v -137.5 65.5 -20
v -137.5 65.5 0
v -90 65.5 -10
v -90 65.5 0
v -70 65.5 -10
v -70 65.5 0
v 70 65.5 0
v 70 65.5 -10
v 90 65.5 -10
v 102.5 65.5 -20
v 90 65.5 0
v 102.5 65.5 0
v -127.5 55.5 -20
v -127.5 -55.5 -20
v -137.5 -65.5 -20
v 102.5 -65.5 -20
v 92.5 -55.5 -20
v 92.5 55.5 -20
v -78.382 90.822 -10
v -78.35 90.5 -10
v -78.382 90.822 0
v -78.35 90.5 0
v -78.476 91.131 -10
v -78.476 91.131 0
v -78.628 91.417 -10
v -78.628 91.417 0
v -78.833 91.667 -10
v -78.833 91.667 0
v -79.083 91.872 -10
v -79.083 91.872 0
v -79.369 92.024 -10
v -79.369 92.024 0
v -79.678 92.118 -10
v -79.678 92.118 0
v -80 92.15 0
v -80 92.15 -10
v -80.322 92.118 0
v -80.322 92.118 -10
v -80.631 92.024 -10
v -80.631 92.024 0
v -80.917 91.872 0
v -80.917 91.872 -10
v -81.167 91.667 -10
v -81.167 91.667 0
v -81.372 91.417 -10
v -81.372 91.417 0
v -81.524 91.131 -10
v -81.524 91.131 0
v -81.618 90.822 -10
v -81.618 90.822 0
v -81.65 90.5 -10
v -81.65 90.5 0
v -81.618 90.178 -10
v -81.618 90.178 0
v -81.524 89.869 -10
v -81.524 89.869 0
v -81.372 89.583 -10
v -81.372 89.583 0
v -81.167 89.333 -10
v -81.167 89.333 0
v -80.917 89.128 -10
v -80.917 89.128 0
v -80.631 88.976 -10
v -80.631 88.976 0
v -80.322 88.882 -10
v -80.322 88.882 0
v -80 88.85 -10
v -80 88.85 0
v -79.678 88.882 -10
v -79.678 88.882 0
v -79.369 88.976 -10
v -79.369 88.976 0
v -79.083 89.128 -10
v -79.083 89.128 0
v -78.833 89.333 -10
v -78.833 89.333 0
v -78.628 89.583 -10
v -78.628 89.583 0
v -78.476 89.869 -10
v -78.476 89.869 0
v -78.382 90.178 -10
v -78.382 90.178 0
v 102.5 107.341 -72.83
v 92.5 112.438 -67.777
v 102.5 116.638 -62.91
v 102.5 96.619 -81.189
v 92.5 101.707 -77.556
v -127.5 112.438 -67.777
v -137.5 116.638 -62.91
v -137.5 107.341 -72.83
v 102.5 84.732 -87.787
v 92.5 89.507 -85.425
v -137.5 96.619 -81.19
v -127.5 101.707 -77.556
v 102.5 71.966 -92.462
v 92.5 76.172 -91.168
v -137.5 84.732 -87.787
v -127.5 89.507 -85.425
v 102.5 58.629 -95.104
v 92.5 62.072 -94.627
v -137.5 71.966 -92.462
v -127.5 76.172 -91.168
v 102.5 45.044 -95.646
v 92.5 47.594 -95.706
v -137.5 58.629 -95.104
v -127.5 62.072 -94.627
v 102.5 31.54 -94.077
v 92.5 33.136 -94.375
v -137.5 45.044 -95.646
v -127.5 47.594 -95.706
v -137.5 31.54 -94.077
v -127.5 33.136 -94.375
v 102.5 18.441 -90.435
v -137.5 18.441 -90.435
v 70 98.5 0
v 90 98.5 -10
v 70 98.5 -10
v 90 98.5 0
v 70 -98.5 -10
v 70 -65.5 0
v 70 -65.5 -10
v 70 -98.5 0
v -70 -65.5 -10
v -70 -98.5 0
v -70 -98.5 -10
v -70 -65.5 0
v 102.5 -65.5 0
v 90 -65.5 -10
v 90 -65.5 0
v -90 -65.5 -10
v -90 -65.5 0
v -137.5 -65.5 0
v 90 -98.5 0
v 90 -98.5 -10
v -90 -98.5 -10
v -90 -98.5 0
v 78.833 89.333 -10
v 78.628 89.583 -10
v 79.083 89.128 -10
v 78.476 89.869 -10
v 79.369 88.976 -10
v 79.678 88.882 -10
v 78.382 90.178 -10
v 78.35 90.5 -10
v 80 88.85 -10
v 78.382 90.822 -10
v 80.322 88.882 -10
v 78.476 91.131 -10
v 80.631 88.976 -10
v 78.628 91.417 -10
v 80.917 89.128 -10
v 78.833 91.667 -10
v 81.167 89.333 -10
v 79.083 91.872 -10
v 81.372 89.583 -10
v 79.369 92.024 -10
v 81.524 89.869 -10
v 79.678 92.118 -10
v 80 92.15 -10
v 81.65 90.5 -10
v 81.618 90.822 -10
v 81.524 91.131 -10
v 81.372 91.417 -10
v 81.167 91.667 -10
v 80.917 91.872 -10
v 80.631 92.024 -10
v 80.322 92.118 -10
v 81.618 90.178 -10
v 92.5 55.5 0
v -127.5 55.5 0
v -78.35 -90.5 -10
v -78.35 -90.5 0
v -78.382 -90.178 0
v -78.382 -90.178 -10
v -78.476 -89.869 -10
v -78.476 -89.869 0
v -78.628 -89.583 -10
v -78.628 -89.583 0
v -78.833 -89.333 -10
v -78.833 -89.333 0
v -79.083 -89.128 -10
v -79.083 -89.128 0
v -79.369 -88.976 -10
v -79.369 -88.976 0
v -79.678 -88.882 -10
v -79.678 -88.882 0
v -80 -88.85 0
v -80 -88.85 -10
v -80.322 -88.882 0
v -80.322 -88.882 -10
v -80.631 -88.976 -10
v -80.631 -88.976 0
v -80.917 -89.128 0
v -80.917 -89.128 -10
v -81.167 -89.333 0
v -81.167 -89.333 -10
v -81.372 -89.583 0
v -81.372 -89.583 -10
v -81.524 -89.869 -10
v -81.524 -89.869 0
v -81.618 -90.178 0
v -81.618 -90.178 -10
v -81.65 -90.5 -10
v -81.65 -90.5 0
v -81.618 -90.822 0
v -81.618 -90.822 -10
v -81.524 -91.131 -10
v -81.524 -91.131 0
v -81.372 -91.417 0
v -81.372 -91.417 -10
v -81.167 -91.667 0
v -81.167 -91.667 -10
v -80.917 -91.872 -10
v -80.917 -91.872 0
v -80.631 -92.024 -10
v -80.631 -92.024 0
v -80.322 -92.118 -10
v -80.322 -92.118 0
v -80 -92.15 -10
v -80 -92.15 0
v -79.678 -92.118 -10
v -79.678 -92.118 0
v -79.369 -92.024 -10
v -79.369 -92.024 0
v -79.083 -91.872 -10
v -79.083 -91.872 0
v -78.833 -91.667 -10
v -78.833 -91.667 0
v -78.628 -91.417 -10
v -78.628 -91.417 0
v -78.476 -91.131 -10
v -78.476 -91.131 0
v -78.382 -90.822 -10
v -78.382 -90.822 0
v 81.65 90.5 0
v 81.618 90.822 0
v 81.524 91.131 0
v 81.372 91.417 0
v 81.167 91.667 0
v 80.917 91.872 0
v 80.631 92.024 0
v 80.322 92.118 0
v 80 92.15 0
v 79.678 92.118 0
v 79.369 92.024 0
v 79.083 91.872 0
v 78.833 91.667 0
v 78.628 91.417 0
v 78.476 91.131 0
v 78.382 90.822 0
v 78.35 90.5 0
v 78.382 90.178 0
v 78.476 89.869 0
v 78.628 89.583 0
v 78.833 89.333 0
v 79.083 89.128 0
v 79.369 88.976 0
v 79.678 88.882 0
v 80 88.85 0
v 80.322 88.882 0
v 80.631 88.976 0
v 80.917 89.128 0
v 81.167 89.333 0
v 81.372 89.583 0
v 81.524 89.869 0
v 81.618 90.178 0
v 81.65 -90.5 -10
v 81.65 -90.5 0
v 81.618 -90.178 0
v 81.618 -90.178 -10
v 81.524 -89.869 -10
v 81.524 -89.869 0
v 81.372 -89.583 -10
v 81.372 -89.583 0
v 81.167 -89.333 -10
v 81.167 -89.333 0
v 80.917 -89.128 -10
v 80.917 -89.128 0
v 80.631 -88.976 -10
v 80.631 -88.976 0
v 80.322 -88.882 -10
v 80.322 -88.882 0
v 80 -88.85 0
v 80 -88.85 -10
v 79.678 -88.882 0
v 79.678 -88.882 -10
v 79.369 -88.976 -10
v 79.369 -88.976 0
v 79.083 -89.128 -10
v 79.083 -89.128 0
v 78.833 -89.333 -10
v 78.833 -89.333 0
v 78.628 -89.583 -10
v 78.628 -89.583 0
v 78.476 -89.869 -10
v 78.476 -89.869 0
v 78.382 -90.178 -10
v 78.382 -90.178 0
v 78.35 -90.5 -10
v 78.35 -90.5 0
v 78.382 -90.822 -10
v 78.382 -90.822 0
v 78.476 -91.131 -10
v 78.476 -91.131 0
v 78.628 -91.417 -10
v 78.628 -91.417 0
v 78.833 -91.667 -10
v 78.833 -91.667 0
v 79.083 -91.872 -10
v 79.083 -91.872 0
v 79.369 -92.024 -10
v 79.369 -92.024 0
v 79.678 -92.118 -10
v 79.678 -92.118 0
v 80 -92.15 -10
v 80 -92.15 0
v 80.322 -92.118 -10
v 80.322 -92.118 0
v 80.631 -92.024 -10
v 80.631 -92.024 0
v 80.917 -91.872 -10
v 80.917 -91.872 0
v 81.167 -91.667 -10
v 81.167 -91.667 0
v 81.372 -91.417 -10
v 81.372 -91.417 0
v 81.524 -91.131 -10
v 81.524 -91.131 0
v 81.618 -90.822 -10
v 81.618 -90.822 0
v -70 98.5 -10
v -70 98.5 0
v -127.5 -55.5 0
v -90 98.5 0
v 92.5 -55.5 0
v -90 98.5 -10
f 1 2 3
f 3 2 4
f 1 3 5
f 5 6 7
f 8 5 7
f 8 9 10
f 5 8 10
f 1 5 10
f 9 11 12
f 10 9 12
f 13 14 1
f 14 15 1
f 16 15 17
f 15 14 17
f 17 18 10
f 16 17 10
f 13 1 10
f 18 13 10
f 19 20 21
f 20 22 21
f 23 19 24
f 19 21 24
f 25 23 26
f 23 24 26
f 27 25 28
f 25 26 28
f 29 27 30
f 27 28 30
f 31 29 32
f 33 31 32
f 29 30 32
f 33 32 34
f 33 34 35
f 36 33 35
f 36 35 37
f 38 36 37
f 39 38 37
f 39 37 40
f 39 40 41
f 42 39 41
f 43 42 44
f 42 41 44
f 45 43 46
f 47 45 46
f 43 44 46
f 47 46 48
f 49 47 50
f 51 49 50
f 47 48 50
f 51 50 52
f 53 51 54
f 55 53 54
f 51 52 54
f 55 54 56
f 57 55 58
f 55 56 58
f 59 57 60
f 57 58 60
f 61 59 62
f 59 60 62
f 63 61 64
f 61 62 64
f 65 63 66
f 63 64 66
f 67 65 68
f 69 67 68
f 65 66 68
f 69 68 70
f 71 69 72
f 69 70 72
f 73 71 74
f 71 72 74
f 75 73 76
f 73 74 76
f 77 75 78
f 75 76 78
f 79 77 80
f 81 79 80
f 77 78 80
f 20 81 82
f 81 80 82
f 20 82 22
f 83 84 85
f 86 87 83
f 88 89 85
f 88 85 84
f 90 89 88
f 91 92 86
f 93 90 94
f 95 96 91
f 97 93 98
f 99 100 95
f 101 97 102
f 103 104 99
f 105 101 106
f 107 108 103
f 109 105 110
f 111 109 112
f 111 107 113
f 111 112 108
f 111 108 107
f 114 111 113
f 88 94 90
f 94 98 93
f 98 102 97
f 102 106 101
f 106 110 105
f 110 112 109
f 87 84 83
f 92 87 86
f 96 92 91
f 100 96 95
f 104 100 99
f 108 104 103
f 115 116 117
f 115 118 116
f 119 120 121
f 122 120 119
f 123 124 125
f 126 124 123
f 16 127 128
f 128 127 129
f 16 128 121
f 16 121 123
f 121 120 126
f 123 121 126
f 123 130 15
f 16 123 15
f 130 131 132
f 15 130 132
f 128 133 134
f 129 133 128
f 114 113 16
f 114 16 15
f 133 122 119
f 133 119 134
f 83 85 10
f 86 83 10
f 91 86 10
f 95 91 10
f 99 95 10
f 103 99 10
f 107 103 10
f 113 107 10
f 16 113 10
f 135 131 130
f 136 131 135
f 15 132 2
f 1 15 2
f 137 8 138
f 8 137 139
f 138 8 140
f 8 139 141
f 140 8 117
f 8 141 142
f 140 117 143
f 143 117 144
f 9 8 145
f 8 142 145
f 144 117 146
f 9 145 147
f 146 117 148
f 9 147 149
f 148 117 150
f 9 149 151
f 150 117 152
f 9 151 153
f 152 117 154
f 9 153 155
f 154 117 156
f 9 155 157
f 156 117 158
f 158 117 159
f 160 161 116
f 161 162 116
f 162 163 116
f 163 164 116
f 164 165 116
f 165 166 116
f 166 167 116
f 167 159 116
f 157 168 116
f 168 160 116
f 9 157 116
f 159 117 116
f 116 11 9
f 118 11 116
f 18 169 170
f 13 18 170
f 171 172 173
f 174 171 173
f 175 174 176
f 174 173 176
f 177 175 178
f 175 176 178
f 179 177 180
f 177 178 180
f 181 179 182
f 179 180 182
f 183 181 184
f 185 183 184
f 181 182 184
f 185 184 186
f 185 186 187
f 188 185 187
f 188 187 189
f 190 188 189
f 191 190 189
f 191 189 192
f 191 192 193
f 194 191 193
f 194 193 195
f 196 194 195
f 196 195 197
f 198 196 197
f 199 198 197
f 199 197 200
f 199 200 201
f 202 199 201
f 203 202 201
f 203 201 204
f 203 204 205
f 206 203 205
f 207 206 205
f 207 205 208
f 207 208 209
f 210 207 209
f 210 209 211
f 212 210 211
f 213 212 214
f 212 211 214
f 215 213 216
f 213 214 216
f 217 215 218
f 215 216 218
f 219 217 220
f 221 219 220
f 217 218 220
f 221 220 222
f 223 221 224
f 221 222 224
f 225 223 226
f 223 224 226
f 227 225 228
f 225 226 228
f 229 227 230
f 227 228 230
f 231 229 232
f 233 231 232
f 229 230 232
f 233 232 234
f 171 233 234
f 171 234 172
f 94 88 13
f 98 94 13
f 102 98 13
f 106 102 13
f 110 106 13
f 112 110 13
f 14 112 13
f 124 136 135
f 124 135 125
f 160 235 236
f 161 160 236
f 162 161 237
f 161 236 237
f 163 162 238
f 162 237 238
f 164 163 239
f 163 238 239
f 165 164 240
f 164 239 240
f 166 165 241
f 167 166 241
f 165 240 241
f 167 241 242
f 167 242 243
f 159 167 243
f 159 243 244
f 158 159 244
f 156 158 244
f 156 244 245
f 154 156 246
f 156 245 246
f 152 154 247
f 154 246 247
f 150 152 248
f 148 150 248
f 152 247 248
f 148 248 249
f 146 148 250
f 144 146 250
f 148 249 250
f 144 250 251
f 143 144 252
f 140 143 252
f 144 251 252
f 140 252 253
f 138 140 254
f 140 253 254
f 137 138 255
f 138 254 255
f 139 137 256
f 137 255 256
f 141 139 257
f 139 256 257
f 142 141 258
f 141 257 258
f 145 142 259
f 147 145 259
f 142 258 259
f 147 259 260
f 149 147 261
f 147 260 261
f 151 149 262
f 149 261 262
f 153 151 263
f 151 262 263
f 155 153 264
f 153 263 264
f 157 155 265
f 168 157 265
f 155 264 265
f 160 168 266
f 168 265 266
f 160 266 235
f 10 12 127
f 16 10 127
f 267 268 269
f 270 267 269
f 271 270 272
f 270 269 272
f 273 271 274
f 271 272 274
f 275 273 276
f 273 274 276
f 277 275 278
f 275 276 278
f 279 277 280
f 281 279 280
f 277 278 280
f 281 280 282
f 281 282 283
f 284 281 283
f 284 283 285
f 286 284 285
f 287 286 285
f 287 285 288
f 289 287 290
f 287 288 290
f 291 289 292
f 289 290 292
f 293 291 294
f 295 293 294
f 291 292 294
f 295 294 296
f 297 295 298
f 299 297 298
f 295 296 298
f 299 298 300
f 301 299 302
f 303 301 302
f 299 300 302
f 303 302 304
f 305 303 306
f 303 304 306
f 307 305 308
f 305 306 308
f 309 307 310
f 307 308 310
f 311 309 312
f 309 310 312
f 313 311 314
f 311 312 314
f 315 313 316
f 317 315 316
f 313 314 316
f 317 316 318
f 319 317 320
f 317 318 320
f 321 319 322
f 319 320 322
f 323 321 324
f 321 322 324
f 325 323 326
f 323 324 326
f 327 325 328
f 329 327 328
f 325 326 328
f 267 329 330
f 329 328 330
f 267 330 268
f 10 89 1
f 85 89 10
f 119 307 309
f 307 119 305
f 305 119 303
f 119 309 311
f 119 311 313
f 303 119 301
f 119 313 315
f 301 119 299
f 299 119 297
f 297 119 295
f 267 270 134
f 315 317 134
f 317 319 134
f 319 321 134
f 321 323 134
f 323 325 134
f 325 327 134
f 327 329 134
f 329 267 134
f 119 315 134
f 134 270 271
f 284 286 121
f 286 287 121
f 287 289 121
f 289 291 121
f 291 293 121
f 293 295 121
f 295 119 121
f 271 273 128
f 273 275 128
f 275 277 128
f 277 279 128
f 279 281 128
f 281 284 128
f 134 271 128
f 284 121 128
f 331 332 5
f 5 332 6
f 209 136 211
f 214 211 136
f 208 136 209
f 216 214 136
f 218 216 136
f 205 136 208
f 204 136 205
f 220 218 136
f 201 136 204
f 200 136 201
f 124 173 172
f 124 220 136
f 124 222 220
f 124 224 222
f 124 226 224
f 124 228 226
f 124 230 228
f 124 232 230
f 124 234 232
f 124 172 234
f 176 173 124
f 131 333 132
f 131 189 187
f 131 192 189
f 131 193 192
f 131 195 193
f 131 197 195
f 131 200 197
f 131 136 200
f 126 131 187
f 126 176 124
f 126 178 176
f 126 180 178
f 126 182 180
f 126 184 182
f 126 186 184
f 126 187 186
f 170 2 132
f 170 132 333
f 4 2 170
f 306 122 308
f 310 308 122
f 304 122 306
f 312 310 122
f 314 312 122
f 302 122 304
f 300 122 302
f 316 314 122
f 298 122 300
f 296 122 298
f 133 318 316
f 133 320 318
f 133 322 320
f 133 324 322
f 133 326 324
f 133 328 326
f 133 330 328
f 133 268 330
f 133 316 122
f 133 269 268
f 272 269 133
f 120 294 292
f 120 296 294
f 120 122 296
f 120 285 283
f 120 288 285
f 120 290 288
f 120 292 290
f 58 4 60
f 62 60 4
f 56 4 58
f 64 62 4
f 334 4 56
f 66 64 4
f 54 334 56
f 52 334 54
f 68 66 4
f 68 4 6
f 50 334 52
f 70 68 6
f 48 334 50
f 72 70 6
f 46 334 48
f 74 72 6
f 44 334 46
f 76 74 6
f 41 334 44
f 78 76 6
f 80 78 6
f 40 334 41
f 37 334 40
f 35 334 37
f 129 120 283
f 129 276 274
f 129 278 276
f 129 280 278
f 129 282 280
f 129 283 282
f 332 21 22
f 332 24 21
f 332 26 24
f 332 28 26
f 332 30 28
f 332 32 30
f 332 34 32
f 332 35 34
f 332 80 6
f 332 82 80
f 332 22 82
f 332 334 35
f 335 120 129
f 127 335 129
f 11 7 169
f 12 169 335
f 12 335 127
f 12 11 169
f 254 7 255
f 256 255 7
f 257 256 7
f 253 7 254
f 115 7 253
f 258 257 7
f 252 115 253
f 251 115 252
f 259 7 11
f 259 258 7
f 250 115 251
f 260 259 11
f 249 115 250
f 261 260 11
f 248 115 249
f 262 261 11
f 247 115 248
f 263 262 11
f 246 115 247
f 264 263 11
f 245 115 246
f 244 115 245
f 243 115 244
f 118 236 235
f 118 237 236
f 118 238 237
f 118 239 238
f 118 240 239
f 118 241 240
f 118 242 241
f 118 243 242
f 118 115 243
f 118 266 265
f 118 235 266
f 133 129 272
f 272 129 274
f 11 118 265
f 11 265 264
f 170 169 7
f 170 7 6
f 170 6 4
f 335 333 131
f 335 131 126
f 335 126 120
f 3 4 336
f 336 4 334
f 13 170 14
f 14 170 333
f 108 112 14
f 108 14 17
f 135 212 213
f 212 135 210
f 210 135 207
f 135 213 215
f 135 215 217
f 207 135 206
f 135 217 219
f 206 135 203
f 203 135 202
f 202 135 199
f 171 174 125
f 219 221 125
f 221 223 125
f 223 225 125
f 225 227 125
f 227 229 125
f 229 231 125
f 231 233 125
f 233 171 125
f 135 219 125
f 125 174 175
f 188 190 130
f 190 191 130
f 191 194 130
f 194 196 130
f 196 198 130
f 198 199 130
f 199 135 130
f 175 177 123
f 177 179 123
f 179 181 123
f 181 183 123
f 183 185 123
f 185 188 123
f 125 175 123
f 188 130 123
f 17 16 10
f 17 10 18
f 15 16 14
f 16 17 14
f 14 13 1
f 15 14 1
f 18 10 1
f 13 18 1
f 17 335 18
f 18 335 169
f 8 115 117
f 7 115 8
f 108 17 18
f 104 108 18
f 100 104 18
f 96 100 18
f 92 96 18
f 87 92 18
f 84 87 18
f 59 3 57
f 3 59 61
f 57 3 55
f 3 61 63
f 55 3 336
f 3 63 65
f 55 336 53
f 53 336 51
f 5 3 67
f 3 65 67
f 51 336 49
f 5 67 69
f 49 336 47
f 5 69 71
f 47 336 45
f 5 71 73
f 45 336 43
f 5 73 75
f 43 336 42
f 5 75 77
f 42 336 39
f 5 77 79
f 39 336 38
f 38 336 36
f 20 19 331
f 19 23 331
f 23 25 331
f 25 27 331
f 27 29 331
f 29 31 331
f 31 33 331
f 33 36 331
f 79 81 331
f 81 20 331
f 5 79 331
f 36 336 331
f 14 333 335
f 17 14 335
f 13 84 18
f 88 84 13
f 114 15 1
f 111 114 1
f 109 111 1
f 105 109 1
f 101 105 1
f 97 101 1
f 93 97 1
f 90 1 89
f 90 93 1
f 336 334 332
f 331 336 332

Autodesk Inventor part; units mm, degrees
ref_plane "YZ Plane" through (0, 0, 0) normal (1, 0, 0) x (0, 1, 0)
ref_plane "XZ Plane" through (0, 0, 0) normal (0, 1, 0) x (-1, 0, 0)
ref_plane "XY Plane" through (0, 0, 0) normal (0, 0, 1) x (1, 0, 0)
sketch "Sketch1" plane through (0, 0, 0) normal (0, 0, 1) x (1, 0, 0)
  line L0 (-80, -90.5) -> (80, -90.5) construction
  line L1 (80, -90.5) -> (80, 90.5) construction
  line L2 (80, 90.5) -> (-80, 90.5) construction
  line L3 (-80, 90.5) -> (-80, -90.5) construction
  line L4 (-80, -90.5) -> (80, 90.5) construction
  line L5 (80, -90.5) -> (-80, 90.5) construction
  line L6 (-137.5, 65.5) -> (102.5, 65.5)
  line L7 (102.5, 65.5) -> (102.5, -65.5)
  line L8 (102.5, -65.5) -> (-137.5, -65.5)
  line L9 (-137.5, -65.5) -> (-137.5, 65.5)
  circle A0 centre (-80, 90.5) radius 1.65
  circle A1 centre (80, 90.5) radius 1.65
  circle A2 centre (-80, -90.5) radius 1.65
  circle A3 centre (80, -90.5) radius 1.65
  line L10 (92.5, 55.5) -> (-127.5, 55.5)
  line L11 (-127.5, 55.5) -> (-127.5, -55.5)
  line L12 (-127.5, -55.5) -> (92.5, -55.5)
  line L13 (92.5, -55.5) -> (92.5, 55.5)
  line L14 (-70, 65.5) -> (-90, 65.5)
  line L15 (-90, 65.5) -> (-90, 98.5)
  line L16 (-90, 98.5) -> (-70, 98.5)
  line L17 (-70, 98.5) -> (-70, 65.5)
  line L18 (90, 98.5) -> (70, 98.5)
  line L19 (70, 98.5) -> (70, 65.5)
  line L20 (70, 65.5) -> (90, 65.5)
  line L21 (90, 65.5) -> (90, 98.5)
  line L22 (90, -65.5) -> (70, -65.5)
  line L23 (70, -65.5) -> (70, -98.5)
  line L24 (70, -98.5) -> (90, -98.5)
  line L25 (90, -98.5) -> (90, -65.5)
  line L26 (-70, -65.5) -> (-90, -65.5)
  line L27 (-90, -65.5) -> (-90, -98.5)
  line L28 (-90, -98.5) -> (-70, -98.5)
  line L29 (-70, -98.5) -> (-70, -65.5)
  point P0 (0, 0)
  point P1 (102.5, 0)
  point P2 (-80, 98.5)
  point P3 (80, 65.5)
  point P4 (80, -98.5)
  point P5 (-80, -98.5)
  point P6 (70, -65.5)
  point P7 (-90, -65.5)
  point P8 (-90, 65.5)
  dimension "d0" = 181
  dimension "d1" = 160
  dimension "d3" = 3.3
  dimension "d4" = 10
  dimension "d5" = 240
  dimension "d6" = 22.5
  dimension "d15" = 25
  dimension "d16" = 20
  dimension "d21" = 20
  dimension "d22" = 33
  dimension "d23" = 20
  dimension "d25" = 20
extrude "Extrusion1" add sketch "Sketch1" against normal blind 20 contours L6 L7 L8 L9
extrude "Extrusion2" add sketch "Sketch1" against normal blind 10 contours L15 L16 L17 L6 | L8 L29 L28 L27 | L19 L18 L21 L6 | L8 L25 L24 L23
sketch "Sketch2" plane through (0, 0, 0) normal (1, 0, 0) x (0, 1, 0)
  line L0 (65.5, 0) -> (-65.5, 0) construction
  line L1 (65.5, 0) -> (65.5, -20) construction
  line L2 (-65.5, -20) -> (65.5, -20) construction
  line L3 (-65.5, 0) -> (-65.5, -20) construction
  line L4 (0, -20) -> (96.9885, -101.383)
  line L5 (-65.5, -20) -> (65.5, -20) projected
  point P0 (0, 0)
  dimension "d29" = 40
sketch "Sketch3" plane through (0, 0, -20) normal (0, 0, -1) x (-1, 0, 0)
  line L0 (-102.5, -65.5) -> (137.5, -65.5) projected
  line L1 (137.5, -65.5) -> (137.5, 65.5) projected
  line L2 (137.5, 65.5) -> (-102.5, 65.5) projected
  line L3 (-102.5, 65.5) -> (-102.5, -65.5) projected
  line L4 (-92.5, -55.5) -> (-92.5, 55.5) projected
  line L5 (-92.5, 55.5) -> (127.5, 55.5) projected
  line L6 (127.5, 55.5) -> (127.5, -55.5) projected
  line L7 (127.5, -55.5) -> (-92.5, -55.5) projected
  point P0 (0, 0)
sweep "Sweep3" add profiles "Sketch3" path "Sketch2" separate body path curves L4
sketch "Sketch4" plane through (-137.5, -65.5, -20) normal (-1, 0, 0) x (0, 0, 1)
  line L0 (0, 0) -> (0, 131) projected
  line L1 (0, 131) -> (-81.383, 227.9885) projected
  line L2 (-81.383, 96.9885) -> (-81.383, 227.9885) projected
  line L3 (0, 0) -> (-81.383, 96.9885) projected
  arc A0 (-42.91, 182.1381) -> (-70.435, 83.9412) centre (11.7677, 113.8556) ccw
  point P0 (20, 65.5)
extrude "Extrusion3" cut sketch "Sketch4" against normal through all contours L3 L2 L1 A0 bodies 2
properties part number "TOBOGAN_BASURA" material "Steel, Mild, Welded"
